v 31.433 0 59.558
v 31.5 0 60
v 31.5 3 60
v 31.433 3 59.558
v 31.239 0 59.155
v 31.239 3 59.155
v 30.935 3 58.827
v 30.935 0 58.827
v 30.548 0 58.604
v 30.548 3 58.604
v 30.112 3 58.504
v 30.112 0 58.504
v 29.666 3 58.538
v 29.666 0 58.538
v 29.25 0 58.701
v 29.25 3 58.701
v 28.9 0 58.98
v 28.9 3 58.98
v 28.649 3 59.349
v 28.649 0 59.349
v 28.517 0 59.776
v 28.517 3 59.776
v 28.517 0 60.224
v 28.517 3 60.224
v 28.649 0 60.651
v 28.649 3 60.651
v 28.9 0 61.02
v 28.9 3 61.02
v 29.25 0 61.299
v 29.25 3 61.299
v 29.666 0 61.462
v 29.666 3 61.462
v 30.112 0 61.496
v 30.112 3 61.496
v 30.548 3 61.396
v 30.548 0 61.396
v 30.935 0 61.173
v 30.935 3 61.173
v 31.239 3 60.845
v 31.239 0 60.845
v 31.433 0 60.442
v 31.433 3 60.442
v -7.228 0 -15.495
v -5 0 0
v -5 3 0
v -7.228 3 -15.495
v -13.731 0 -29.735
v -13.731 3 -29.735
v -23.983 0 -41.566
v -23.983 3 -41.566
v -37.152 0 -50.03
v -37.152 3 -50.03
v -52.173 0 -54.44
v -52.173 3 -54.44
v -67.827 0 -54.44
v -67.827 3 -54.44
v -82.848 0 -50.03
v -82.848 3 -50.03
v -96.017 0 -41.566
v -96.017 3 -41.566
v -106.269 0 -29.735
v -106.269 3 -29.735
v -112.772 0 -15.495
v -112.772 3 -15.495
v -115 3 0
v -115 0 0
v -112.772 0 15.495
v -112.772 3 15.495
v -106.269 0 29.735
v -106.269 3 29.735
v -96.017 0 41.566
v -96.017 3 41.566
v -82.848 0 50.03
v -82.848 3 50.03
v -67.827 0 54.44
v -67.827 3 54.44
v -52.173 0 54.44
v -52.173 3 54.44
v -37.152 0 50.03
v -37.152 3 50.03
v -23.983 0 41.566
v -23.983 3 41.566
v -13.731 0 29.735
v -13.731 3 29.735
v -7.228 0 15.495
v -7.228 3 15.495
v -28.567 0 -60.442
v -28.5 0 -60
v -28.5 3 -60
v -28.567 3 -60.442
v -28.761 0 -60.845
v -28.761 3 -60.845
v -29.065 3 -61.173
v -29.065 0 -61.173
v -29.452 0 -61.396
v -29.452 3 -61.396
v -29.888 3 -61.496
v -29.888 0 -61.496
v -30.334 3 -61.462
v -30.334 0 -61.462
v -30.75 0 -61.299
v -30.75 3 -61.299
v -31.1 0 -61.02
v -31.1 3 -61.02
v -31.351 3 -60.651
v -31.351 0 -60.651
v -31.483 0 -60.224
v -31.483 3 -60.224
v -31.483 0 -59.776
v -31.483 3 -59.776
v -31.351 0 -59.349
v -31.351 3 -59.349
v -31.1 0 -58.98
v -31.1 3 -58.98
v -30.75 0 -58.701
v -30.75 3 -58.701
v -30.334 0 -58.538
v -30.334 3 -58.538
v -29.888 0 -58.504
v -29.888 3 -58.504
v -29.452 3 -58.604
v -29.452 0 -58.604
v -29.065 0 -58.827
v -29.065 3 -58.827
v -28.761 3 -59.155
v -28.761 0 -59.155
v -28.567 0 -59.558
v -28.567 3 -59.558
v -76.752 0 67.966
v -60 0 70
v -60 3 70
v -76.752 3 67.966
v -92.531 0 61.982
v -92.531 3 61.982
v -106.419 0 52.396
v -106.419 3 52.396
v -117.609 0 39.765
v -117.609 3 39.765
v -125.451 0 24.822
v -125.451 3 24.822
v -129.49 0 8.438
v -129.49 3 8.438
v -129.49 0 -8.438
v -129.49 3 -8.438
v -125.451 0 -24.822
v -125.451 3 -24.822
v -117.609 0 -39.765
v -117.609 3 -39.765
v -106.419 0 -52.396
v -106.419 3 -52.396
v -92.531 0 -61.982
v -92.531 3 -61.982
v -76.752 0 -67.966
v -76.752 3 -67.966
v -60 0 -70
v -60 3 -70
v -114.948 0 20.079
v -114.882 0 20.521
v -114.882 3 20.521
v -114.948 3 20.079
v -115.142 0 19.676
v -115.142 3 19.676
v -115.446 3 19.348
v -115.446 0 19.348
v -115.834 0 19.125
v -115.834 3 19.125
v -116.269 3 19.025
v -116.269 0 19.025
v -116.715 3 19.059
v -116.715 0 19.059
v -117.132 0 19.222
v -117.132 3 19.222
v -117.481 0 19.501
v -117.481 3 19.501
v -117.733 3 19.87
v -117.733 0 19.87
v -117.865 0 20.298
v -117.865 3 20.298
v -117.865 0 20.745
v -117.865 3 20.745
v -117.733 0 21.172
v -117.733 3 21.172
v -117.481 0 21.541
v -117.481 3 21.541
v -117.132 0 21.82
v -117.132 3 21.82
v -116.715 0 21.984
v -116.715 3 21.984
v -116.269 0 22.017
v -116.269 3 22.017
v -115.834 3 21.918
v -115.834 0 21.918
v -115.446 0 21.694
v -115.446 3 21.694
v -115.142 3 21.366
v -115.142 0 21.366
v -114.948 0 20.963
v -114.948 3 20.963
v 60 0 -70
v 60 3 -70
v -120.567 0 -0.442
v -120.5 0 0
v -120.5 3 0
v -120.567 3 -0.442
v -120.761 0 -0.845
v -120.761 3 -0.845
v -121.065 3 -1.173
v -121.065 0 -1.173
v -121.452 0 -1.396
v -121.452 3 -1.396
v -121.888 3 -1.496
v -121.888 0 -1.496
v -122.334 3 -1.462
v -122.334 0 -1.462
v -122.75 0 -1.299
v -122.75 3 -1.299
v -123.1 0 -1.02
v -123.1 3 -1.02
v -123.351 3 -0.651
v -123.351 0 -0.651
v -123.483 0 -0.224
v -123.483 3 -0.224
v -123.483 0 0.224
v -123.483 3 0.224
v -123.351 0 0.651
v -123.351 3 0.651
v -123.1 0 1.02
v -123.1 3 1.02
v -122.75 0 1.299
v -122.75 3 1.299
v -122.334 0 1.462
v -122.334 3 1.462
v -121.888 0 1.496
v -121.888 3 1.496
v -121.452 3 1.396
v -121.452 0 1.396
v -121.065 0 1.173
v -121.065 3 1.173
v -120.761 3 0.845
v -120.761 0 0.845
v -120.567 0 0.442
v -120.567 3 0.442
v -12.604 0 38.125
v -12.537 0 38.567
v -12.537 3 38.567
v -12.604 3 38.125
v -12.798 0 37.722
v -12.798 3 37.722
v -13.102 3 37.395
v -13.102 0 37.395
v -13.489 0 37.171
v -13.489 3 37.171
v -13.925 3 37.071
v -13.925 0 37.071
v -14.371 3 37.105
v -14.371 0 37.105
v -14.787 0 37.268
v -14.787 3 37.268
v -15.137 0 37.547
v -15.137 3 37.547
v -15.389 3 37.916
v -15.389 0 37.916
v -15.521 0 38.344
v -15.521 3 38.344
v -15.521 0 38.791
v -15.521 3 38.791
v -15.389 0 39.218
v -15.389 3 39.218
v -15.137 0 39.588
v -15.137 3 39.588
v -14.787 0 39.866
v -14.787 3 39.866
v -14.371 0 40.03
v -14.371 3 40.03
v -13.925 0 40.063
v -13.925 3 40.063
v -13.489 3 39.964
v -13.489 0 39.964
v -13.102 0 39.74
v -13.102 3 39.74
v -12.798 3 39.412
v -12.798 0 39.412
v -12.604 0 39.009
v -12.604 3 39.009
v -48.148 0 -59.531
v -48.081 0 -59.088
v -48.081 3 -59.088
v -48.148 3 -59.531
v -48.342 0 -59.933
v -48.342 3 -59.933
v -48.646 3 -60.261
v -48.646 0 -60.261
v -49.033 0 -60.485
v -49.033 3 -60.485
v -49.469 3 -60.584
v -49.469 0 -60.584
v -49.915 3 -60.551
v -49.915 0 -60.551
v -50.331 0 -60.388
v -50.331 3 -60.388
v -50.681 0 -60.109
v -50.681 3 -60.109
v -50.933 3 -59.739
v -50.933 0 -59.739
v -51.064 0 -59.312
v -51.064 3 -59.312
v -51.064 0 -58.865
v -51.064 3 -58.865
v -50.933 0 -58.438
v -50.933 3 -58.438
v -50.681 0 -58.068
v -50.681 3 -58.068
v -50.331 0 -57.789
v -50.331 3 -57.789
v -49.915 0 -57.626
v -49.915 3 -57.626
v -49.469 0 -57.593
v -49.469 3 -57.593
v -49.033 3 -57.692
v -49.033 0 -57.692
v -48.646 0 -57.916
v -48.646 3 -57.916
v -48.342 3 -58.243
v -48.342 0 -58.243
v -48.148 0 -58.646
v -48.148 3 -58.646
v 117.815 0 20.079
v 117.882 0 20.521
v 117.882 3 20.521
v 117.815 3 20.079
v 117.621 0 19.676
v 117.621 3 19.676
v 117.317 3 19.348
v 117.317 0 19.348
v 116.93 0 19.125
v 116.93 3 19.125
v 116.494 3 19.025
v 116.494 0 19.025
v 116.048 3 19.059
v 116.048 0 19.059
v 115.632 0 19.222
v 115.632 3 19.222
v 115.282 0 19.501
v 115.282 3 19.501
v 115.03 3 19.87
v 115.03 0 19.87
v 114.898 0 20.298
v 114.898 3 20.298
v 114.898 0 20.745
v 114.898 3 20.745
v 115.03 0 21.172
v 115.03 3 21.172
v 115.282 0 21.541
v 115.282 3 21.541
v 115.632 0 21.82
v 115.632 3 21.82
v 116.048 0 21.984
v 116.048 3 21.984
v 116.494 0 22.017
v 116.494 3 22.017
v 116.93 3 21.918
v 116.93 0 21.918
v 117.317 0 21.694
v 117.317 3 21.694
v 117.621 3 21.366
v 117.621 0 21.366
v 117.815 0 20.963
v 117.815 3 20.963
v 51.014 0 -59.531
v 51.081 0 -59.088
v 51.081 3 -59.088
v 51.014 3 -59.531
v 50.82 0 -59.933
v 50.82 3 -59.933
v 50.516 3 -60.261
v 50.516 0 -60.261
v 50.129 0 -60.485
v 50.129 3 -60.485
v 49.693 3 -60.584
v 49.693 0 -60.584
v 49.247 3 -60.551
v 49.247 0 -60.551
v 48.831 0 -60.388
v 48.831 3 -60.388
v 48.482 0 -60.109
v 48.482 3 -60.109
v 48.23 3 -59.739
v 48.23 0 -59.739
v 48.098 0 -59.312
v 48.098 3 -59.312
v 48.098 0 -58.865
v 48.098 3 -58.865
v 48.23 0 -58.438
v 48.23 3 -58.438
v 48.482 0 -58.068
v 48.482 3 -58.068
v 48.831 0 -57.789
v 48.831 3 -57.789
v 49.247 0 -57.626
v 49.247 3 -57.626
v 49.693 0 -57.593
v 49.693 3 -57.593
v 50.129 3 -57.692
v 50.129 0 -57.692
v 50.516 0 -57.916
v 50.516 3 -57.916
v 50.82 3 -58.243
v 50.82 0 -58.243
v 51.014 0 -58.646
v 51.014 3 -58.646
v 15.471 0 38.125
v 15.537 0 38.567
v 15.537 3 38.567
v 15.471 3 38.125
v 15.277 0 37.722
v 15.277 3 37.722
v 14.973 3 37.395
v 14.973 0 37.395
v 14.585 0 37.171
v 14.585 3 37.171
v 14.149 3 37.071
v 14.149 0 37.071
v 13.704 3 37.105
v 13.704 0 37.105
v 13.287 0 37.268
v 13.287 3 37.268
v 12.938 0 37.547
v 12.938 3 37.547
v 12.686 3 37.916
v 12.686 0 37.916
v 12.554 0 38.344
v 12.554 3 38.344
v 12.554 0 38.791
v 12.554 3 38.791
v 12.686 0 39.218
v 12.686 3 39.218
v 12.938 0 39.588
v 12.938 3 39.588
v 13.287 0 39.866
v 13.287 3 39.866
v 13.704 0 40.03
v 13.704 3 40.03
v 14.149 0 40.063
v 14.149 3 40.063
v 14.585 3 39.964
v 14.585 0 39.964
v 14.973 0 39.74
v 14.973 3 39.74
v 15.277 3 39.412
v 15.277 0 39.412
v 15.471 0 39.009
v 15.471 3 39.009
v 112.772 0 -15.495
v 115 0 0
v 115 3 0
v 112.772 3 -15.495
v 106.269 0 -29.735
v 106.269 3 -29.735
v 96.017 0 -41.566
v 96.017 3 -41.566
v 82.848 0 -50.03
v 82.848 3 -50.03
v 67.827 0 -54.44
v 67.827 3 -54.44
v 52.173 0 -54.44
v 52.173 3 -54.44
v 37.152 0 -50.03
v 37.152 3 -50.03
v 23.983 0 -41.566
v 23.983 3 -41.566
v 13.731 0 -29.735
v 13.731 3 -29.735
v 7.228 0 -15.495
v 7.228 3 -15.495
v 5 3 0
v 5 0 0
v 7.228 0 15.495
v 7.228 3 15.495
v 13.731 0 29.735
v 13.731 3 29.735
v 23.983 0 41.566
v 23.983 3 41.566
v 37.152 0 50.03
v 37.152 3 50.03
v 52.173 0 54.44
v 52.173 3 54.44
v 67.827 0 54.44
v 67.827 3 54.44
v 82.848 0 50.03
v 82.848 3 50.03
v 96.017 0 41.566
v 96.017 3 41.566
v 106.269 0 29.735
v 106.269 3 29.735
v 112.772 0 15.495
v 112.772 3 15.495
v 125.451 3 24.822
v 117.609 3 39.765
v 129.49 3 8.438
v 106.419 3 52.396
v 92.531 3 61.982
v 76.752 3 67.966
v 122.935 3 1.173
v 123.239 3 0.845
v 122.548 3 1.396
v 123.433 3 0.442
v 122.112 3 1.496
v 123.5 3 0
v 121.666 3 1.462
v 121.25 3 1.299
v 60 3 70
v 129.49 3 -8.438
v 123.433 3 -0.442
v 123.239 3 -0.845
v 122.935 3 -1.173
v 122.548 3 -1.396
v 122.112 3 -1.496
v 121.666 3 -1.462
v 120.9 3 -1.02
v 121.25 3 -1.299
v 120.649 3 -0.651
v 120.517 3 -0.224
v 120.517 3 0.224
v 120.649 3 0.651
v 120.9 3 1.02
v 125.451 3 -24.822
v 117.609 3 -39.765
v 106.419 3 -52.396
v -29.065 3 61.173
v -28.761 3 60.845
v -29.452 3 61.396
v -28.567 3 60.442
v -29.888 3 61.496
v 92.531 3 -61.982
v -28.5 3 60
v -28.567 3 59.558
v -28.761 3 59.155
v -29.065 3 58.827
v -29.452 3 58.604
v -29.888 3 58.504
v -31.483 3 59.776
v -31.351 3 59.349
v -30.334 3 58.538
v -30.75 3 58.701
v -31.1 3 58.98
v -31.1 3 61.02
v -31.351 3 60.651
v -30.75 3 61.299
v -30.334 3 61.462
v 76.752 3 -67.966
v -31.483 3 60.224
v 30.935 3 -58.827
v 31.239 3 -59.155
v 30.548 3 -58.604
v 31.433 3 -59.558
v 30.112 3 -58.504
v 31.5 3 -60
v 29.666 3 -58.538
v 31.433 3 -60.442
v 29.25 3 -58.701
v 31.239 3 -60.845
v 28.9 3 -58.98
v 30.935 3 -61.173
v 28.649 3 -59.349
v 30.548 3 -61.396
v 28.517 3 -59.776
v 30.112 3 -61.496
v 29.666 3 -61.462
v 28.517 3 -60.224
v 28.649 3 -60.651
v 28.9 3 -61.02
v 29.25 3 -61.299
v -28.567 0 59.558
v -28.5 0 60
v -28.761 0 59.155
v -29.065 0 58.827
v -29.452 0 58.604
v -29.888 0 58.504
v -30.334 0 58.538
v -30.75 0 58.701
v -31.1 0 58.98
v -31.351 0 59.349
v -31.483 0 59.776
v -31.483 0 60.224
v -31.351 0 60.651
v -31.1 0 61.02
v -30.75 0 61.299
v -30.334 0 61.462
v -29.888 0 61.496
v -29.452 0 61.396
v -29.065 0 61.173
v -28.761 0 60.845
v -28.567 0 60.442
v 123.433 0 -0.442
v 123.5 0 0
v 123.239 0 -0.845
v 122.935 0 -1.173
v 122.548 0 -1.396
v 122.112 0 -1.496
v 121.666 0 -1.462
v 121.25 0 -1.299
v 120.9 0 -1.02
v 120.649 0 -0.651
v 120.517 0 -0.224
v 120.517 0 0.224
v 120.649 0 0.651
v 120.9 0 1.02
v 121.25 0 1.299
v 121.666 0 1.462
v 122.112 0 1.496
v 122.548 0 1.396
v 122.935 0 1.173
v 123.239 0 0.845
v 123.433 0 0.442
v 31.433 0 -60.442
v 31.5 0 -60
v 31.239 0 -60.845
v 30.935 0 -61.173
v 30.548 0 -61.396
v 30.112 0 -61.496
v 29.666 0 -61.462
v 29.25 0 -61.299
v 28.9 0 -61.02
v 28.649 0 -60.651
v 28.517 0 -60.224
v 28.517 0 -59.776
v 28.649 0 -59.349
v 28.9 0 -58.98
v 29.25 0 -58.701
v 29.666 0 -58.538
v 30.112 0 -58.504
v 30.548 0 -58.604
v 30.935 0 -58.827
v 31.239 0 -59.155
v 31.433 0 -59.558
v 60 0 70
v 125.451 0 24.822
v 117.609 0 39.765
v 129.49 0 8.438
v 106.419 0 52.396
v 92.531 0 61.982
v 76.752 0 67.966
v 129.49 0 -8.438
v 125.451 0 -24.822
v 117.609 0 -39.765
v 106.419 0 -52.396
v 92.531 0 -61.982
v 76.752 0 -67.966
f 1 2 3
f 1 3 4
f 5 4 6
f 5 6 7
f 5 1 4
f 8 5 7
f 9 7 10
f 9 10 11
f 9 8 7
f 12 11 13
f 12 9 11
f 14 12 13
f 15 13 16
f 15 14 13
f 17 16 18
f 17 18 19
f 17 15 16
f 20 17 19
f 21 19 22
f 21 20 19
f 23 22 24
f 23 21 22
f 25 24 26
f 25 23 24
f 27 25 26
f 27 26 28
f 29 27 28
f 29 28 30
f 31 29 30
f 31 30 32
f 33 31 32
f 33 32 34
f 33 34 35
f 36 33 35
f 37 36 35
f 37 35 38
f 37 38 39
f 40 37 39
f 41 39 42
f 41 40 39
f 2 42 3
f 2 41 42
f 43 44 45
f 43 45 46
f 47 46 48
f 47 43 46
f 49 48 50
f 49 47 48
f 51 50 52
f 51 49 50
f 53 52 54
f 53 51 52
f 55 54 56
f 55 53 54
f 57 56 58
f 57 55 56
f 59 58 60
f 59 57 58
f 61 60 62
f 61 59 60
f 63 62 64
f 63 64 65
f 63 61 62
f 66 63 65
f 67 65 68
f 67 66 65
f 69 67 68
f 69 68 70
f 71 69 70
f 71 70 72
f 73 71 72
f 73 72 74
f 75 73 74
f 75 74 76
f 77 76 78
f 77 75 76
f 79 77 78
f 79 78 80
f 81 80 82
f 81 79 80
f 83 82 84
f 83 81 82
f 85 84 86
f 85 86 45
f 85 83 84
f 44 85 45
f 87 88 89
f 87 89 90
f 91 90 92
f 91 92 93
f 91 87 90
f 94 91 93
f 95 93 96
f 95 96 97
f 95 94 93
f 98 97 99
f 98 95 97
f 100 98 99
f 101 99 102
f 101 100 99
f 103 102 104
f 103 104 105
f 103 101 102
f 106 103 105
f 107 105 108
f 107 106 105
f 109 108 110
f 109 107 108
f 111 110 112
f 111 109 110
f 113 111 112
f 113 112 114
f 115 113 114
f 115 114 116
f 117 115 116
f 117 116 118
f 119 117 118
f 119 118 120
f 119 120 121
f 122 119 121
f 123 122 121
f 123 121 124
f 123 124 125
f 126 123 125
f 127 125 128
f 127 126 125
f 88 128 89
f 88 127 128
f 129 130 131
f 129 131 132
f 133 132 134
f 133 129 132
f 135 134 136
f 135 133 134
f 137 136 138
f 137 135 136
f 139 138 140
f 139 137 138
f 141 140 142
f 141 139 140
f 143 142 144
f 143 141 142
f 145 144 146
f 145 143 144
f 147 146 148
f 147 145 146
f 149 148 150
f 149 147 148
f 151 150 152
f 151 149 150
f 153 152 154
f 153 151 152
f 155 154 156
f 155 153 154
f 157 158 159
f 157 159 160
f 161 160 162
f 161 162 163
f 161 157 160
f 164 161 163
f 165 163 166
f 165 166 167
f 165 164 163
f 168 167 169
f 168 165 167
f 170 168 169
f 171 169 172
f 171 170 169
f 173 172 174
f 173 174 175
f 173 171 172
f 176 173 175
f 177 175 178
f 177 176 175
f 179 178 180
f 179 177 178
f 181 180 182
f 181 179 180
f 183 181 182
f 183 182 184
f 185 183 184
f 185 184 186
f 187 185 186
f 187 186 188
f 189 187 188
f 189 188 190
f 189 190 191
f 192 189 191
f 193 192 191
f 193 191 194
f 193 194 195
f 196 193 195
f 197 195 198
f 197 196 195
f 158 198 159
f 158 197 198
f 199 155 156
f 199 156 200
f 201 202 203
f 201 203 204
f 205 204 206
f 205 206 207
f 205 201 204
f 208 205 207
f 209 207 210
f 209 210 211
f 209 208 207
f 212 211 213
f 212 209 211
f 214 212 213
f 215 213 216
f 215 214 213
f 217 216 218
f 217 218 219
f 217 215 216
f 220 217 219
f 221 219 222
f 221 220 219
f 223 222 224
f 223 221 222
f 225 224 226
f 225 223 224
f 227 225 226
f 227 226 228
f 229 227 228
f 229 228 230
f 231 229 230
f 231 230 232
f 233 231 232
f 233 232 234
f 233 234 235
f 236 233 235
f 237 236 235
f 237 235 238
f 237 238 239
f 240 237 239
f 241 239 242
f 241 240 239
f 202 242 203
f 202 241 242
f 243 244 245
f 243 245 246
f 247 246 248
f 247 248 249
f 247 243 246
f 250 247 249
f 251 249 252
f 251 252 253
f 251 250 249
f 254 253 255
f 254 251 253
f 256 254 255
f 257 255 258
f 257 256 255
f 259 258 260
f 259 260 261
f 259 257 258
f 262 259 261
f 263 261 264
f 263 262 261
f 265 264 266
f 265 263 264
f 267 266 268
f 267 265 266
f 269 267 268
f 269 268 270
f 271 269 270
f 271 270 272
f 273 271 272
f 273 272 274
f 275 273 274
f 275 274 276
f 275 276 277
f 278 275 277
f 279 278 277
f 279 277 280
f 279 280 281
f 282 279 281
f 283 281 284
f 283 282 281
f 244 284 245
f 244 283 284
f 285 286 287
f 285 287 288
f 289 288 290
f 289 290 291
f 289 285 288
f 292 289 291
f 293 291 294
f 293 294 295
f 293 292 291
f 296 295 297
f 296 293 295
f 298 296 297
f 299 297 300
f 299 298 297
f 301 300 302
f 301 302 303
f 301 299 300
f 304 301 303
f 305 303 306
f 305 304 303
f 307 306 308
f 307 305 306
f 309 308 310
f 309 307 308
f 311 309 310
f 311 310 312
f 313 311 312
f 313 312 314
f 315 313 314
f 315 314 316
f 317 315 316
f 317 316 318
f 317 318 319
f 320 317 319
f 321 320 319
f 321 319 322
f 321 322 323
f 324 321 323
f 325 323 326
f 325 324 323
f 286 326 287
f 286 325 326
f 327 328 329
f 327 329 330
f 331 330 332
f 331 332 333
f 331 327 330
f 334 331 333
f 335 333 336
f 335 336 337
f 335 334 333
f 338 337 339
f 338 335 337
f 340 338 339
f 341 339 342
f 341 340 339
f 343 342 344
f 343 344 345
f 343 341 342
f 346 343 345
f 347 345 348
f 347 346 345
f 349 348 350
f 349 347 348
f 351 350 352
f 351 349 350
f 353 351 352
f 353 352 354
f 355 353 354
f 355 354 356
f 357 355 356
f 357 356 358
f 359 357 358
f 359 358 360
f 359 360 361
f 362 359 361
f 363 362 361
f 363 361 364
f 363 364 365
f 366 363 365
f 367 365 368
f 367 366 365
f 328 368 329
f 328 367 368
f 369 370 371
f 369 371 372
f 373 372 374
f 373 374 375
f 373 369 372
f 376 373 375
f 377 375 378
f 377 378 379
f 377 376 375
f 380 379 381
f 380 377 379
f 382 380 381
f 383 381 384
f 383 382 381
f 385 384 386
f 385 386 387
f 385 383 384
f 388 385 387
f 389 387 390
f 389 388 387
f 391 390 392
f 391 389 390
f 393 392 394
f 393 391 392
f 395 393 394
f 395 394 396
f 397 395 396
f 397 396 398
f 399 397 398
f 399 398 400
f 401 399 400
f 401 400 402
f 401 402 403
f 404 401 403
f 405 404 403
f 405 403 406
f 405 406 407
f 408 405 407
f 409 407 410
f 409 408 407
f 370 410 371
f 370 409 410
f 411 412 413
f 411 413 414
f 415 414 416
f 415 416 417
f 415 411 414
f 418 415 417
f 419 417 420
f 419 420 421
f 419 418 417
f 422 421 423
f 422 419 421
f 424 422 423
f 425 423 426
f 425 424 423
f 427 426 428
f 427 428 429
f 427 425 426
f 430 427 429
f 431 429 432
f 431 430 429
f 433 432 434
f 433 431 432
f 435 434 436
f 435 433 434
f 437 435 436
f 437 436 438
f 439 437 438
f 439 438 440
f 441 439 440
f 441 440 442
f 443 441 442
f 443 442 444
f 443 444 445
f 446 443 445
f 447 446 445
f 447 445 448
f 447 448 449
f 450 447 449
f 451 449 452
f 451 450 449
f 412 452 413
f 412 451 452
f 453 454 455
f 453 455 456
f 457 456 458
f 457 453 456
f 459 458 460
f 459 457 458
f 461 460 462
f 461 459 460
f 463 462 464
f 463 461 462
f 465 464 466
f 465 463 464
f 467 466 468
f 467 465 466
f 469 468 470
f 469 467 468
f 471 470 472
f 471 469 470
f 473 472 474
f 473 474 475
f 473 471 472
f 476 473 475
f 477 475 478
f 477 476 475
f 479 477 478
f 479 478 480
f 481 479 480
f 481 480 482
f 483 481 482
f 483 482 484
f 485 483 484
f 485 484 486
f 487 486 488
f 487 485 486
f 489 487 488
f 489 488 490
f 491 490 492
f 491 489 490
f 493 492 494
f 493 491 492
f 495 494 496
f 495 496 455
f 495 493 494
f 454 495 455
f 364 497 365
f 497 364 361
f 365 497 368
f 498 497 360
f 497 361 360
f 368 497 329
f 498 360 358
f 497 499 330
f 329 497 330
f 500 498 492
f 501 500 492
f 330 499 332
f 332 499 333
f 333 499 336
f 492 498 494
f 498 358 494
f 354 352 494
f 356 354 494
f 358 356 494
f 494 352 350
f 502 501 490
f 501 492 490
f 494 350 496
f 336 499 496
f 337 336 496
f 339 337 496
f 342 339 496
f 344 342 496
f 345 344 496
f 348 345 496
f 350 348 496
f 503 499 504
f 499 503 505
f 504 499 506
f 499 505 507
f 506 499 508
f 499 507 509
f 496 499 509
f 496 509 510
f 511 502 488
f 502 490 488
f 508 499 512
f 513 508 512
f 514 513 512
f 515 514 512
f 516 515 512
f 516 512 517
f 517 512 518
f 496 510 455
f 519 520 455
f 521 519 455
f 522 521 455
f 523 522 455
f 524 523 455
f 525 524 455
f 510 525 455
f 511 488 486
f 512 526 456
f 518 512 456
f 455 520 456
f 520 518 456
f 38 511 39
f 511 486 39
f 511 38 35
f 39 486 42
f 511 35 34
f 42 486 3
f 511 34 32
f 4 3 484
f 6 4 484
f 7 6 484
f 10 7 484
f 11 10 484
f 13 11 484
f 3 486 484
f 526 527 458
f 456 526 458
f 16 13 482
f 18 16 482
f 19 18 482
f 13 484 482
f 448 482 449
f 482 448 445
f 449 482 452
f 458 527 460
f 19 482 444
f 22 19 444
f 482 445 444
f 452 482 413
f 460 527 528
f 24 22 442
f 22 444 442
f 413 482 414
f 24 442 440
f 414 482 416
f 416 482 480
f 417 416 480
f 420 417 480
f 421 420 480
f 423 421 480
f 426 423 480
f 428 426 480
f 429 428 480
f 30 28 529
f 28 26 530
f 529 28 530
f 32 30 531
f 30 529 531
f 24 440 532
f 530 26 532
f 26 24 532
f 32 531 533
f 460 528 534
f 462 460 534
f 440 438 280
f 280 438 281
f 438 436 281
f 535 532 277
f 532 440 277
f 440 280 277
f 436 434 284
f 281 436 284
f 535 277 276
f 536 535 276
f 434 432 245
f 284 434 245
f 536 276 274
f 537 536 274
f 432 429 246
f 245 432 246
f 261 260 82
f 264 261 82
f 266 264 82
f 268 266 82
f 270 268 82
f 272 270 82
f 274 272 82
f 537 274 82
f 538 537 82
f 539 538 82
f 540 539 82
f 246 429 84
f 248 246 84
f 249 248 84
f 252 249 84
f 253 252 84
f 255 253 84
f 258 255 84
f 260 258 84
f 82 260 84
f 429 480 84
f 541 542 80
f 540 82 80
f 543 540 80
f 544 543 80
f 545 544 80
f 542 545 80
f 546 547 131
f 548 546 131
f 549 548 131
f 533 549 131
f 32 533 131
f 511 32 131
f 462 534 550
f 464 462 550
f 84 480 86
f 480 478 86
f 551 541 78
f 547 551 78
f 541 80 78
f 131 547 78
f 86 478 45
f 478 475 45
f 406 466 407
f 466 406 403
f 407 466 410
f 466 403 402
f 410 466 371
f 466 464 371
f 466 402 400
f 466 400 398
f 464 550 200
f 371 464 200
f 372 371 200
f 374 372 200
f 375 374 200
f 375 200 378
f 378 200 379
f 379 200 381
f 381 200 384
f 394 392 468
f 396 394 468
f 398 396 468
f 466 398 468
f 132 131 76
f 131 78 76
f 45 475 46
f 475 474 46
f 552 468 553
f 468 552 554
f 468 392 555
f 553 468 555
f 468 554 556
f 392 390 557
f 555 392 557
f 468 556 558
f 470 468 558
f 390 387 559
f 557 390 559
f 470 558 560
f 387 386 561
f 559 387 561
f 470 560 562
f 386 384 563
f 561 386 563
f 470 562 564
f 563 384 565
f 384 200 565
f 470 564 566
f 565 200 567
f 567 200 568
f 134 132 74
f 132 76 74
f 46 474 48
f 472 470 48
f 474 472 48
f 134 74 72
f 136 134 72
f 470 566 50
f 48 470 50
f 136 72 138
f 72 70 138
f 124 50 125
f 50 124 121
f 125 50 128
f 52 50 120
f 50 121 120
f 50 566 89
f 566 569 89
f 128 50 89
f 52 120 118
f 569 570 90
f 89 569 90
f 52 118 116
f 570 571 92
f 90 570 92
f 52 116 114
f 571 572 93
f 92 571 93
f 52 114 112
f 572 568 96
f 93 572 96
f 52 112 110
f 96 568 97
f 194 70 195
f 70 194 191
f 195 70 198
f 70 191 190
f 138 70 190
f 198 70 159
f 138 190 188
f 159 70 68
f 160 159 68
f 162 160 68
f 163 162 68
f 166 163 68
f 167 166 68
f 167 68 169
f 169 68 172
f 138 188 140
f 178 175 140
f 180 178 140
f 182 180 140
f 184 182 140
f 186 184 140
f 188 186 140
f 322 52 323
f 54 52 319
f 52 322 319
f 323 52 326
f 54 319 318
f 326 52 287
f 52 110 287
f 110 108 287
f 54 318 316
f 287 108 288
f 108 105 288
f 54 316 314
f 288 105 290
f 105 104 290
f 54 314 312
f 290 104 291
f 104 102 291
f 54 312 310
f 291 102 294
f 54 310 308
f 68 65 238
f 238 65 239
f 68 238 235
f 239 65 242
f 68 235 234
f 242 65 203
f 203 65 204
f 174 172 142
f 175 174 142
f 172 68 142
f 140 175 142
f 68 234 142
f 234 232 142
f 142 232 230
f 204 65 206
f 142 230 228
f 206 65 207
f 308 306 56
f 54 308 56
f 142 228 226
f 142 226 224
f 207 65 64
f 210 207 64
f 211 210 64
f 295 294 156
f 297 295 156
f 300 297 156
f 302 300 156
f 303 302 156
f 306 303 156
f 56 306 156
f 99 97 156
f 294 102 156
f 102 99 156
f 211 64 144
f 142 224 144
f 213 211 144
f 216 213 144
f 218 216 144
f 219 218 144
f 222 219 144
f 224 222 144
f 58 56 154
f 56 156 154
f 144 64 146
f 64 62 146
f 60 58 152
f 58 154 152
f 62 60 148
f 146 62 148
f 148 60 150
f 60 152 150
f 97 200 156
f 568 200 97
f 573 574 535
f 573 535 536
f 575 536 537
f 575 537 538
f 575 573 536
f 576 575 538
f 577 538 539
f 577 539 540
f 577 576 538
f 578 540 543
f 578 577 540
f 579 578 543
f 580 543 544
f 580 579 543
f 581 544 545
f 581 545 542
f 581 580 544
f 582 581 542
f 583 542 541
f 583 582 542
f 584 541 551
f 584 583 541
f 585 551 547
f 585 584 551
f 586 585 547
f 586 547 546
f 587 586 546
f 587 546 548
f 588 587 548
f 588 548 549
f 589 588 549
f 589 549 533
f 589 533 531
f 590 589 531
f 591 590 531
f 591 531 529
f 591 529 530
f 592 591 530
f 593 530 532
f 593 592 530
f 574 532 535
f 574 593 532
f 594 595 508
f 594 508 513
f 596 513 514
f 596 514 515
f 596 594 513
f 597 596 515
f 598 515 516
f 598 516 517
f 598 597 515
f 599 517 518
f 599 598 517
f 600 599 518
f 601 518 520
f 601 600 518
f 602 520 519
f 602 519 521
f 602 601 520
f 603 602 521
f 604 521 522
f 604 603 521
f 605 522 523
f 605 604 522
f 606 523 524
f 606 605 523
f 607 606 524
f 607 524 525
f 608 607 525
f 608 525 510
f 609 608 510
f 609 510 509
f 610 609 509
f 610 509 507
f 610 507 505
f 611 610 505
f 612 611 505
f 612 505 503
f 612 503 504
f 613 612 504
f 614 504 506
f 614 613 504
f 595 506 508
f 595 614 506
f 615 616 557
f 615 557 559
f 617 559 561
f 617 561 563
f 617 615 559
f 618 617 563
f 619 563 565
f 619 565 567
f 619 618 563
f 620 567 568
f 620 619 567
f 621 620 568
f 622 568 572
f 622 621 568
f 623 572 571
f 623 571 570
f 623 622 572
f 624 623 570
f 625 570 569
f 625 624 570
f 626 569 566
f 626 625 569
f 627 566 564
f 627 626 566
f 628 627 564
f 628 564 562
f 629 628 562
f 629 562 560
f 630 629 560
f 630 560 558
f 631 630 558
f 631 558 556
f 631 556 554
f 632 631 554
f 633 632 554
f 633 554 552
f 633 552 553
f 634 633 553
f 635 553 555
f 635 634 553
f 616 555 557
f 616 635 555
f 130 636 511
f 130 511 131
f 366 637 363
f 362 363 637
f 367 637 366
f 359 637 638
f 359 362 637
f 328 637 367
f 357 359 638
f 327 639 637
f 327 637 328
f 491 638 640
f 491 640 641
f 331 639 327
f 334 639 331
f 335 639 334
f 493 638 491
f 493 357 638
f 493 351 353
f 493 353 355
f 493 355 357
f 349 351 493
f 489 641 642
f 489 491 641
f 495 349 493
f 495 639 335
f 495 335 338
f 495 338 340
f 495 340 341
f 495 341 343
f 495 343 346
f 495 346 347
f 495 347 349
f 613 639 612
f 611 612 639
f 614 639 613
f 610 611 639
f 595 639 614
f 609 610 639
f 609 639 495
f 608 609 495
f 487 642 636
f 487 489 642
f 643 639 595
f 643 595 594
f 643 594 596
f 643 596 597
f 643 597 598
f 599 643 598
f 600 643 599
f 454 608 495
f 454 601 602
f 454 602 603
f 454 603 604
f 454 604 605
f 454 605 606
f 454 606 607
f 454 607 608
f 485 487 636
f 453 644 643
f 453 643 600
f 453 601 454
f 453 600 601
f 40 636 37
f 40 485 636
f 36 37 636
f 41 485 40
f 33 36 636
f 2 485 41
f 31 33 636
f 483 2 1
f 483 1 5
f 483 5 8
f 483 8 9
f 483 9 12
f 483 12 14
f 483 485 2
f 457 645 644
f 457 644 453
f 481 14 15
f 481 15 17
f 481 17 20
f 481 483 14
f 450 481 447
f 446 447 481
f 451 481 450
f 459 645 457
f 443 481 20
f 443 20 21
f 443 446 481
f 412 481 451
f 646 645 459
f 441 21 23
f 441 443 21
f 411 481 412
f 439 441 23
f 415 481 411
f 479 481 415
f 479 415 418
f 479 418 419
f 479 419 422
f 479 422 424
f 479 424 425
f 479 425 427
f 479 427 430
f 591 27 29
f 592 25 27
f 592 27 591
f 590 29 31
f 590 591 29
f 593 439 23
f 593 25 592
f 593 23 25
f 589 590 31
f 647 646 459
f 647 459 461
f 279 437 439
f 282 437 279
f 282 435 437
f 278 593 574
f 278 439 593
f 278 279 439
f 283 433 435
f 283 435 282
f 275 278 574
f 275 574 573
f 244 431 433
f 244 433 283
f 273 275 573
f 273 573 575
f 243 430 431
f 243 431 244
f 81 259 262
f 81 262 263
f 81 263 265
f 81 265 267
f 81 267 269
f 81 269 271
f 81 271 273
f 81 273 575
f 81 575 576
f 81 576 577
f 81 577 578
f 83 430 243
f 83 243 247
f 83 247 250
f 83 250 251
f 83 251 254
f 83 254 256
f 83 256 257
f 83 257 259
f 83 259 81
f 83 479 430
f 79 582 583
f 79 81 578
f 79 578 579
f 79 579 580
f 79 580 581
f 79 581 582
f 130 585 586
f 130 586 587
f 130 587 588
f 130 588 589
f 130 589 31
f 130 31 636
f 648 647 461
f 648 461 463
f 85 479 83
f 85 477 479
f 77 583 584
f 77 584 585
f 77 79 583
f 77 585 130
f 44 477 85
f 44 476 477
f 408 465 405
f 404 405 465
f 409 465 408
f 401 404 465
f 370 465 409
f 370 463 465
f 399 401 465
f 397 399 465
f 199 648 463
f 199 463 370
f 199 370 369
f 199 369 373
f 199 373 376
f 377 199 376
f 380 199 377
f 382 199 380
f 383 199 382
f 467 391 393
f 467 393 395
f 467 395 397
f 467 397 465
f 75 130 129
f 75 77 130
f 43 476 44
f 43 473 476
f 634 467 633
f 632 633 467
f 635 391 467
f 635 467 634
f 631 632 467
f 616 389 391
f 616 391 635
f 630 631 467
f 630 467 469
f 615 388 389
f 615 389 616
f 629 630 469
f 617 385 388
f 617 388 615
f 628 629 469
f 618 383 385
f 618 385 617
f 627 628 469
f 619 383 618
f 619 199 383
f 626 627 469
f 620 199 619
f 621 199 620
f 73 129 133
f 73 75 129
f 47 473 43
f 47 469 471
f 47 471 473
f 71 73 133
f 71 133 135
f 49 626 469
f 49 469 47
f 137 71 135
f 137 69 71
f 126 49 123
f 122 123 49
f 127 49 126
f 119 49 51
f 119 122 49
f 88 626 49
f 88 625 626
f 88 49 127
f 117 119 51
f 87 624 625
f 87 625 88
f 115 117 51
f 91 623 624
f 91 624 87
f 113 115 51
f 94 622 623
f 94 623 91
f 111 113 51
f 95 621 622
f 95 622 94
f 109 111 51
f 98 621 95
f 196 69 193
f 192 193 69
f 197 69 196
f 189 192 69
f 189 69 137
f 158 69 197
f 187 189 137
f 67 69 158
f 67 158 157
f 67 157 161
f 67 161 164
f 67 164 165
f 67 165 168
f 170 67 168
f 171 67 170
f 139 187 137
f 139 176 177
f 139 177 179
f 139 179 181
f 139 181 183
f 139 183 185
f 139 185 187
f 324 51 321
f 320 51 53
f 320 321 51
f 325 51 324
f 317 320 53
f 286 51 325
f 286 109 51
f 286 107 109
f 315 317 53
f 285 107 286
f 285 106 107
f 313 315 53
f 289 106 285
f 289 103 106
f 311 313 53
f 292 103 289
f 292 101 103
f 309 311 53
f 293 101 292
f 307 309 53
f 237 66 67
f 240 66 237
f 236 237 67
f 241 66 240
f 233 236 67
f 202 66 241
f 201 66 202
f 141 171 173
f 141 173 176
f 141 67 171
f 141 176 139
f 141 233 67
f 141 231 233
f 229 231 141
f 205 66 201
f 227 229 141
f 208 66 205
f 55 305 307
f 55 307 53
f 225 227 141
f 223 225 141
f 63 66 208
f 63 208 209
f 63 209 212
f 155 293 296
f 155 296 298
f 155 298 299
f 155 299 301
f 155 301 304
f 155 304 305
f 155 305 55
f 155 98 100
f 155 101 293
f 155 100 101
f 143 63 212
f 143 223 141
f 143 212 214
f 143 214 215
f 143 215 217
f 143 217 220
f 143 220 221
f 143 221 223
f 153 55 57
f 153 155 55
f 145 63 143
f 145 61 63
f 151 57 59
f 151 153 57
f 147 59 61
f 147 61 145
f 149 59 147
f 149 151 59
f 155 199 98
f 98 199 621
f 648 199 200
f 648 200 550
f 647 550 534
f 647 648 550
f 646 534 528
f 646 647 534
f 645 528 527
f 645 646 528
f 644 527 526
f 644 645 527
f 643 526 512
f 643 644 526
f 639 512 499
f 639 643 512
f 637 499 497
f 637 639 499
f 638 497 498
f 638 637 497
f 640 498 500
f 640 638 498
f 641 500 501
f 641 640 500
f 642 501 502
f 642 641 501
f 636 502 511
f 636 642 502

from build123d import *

# Parameters (mm, degrees)
SKETCH_1_R      = 55
SKETCH_1_R_2    = 1.5
EXTRUDE_2_DEPTH = 3


with BuildPart() as part:
    # 草图1 → 凸台-拉伸2 (new body)
    with BuildSketch(Plane(origin=(0, 0, 0), x_dir=(1, 0, 0), z_dir=(0, 1, 0))):
        with BuildLine():
            Line((-60, 70), (60, 70))
            ThreePointArc((60, 70), (130, 0), (60, -70))
            Line((60, -70), (-60, -70))
            ThreePointArc((-60, -70), (-130, 0), (-60, 70))
        make_face()
        with Locations((-60, 0)):
            Circle(SKETCH_1_R, mode=Mode.SUBTRACT)
        with Locations((60, 0)):
            Circle(SKETCH_1_R, mode=Mode.SUBTRACT)
        with Locations((-122, 0)):
            Circle(SKETCH_1_R_2, mode=Mode.SUBTRACT)
        with Locations((122, 0)):
            Circle(SKETCH_1_R_2, mode=Mode.SUBTRACT)
        with Locations((-30, 60)):
            Circle(SKETCH_1_R_2, mode=Mode.SUBTRACT)
        with Locations((30, 60)):
            Circle(SKETCH_1_R_2, mode=Mode.SUBTRACT)
        with Locations((30, -60)):
            Circle(SKETCH_1_R_2, mode=Mode.SUBTRACT)
        with Locations((-30, -60)):
            Circle(SKETCH_1_R_2, mode=Mode.SUBTRACT)
        with Locations((-49.58110934, 59.088465181)):
            Circle(SKETCH_1_R_2, mode=Mode.SUBTRACT)
        with Locations((-116.381557247, -20.5212086)):
            Circle(SKETCH_1_R_2, mode=Mode.SUBTRACT)
        with Locations((-14.037333413, -38.567256581)):
            Circle(SKETCH_1_R_2, mode=Mode.SUBTRACT)
        with Locations((14.037333413, -38.567256581)):
            Circle(SKETCH_1_R_2, mode=Mode.SUBTRACT)
        with Locations((116.381557247, -20.5212086)):
            Circle(SKETCH_1_R_2, mode=Mode.SUBTRACT)
        with Locations((49.58110934, 59.088465181)):
            Circle(SKETCH_1_R_2, mode=Mode.SUBTRACT)
    extrude(amount=EXTRUDE_2_DEPTH)


solid = part.part
